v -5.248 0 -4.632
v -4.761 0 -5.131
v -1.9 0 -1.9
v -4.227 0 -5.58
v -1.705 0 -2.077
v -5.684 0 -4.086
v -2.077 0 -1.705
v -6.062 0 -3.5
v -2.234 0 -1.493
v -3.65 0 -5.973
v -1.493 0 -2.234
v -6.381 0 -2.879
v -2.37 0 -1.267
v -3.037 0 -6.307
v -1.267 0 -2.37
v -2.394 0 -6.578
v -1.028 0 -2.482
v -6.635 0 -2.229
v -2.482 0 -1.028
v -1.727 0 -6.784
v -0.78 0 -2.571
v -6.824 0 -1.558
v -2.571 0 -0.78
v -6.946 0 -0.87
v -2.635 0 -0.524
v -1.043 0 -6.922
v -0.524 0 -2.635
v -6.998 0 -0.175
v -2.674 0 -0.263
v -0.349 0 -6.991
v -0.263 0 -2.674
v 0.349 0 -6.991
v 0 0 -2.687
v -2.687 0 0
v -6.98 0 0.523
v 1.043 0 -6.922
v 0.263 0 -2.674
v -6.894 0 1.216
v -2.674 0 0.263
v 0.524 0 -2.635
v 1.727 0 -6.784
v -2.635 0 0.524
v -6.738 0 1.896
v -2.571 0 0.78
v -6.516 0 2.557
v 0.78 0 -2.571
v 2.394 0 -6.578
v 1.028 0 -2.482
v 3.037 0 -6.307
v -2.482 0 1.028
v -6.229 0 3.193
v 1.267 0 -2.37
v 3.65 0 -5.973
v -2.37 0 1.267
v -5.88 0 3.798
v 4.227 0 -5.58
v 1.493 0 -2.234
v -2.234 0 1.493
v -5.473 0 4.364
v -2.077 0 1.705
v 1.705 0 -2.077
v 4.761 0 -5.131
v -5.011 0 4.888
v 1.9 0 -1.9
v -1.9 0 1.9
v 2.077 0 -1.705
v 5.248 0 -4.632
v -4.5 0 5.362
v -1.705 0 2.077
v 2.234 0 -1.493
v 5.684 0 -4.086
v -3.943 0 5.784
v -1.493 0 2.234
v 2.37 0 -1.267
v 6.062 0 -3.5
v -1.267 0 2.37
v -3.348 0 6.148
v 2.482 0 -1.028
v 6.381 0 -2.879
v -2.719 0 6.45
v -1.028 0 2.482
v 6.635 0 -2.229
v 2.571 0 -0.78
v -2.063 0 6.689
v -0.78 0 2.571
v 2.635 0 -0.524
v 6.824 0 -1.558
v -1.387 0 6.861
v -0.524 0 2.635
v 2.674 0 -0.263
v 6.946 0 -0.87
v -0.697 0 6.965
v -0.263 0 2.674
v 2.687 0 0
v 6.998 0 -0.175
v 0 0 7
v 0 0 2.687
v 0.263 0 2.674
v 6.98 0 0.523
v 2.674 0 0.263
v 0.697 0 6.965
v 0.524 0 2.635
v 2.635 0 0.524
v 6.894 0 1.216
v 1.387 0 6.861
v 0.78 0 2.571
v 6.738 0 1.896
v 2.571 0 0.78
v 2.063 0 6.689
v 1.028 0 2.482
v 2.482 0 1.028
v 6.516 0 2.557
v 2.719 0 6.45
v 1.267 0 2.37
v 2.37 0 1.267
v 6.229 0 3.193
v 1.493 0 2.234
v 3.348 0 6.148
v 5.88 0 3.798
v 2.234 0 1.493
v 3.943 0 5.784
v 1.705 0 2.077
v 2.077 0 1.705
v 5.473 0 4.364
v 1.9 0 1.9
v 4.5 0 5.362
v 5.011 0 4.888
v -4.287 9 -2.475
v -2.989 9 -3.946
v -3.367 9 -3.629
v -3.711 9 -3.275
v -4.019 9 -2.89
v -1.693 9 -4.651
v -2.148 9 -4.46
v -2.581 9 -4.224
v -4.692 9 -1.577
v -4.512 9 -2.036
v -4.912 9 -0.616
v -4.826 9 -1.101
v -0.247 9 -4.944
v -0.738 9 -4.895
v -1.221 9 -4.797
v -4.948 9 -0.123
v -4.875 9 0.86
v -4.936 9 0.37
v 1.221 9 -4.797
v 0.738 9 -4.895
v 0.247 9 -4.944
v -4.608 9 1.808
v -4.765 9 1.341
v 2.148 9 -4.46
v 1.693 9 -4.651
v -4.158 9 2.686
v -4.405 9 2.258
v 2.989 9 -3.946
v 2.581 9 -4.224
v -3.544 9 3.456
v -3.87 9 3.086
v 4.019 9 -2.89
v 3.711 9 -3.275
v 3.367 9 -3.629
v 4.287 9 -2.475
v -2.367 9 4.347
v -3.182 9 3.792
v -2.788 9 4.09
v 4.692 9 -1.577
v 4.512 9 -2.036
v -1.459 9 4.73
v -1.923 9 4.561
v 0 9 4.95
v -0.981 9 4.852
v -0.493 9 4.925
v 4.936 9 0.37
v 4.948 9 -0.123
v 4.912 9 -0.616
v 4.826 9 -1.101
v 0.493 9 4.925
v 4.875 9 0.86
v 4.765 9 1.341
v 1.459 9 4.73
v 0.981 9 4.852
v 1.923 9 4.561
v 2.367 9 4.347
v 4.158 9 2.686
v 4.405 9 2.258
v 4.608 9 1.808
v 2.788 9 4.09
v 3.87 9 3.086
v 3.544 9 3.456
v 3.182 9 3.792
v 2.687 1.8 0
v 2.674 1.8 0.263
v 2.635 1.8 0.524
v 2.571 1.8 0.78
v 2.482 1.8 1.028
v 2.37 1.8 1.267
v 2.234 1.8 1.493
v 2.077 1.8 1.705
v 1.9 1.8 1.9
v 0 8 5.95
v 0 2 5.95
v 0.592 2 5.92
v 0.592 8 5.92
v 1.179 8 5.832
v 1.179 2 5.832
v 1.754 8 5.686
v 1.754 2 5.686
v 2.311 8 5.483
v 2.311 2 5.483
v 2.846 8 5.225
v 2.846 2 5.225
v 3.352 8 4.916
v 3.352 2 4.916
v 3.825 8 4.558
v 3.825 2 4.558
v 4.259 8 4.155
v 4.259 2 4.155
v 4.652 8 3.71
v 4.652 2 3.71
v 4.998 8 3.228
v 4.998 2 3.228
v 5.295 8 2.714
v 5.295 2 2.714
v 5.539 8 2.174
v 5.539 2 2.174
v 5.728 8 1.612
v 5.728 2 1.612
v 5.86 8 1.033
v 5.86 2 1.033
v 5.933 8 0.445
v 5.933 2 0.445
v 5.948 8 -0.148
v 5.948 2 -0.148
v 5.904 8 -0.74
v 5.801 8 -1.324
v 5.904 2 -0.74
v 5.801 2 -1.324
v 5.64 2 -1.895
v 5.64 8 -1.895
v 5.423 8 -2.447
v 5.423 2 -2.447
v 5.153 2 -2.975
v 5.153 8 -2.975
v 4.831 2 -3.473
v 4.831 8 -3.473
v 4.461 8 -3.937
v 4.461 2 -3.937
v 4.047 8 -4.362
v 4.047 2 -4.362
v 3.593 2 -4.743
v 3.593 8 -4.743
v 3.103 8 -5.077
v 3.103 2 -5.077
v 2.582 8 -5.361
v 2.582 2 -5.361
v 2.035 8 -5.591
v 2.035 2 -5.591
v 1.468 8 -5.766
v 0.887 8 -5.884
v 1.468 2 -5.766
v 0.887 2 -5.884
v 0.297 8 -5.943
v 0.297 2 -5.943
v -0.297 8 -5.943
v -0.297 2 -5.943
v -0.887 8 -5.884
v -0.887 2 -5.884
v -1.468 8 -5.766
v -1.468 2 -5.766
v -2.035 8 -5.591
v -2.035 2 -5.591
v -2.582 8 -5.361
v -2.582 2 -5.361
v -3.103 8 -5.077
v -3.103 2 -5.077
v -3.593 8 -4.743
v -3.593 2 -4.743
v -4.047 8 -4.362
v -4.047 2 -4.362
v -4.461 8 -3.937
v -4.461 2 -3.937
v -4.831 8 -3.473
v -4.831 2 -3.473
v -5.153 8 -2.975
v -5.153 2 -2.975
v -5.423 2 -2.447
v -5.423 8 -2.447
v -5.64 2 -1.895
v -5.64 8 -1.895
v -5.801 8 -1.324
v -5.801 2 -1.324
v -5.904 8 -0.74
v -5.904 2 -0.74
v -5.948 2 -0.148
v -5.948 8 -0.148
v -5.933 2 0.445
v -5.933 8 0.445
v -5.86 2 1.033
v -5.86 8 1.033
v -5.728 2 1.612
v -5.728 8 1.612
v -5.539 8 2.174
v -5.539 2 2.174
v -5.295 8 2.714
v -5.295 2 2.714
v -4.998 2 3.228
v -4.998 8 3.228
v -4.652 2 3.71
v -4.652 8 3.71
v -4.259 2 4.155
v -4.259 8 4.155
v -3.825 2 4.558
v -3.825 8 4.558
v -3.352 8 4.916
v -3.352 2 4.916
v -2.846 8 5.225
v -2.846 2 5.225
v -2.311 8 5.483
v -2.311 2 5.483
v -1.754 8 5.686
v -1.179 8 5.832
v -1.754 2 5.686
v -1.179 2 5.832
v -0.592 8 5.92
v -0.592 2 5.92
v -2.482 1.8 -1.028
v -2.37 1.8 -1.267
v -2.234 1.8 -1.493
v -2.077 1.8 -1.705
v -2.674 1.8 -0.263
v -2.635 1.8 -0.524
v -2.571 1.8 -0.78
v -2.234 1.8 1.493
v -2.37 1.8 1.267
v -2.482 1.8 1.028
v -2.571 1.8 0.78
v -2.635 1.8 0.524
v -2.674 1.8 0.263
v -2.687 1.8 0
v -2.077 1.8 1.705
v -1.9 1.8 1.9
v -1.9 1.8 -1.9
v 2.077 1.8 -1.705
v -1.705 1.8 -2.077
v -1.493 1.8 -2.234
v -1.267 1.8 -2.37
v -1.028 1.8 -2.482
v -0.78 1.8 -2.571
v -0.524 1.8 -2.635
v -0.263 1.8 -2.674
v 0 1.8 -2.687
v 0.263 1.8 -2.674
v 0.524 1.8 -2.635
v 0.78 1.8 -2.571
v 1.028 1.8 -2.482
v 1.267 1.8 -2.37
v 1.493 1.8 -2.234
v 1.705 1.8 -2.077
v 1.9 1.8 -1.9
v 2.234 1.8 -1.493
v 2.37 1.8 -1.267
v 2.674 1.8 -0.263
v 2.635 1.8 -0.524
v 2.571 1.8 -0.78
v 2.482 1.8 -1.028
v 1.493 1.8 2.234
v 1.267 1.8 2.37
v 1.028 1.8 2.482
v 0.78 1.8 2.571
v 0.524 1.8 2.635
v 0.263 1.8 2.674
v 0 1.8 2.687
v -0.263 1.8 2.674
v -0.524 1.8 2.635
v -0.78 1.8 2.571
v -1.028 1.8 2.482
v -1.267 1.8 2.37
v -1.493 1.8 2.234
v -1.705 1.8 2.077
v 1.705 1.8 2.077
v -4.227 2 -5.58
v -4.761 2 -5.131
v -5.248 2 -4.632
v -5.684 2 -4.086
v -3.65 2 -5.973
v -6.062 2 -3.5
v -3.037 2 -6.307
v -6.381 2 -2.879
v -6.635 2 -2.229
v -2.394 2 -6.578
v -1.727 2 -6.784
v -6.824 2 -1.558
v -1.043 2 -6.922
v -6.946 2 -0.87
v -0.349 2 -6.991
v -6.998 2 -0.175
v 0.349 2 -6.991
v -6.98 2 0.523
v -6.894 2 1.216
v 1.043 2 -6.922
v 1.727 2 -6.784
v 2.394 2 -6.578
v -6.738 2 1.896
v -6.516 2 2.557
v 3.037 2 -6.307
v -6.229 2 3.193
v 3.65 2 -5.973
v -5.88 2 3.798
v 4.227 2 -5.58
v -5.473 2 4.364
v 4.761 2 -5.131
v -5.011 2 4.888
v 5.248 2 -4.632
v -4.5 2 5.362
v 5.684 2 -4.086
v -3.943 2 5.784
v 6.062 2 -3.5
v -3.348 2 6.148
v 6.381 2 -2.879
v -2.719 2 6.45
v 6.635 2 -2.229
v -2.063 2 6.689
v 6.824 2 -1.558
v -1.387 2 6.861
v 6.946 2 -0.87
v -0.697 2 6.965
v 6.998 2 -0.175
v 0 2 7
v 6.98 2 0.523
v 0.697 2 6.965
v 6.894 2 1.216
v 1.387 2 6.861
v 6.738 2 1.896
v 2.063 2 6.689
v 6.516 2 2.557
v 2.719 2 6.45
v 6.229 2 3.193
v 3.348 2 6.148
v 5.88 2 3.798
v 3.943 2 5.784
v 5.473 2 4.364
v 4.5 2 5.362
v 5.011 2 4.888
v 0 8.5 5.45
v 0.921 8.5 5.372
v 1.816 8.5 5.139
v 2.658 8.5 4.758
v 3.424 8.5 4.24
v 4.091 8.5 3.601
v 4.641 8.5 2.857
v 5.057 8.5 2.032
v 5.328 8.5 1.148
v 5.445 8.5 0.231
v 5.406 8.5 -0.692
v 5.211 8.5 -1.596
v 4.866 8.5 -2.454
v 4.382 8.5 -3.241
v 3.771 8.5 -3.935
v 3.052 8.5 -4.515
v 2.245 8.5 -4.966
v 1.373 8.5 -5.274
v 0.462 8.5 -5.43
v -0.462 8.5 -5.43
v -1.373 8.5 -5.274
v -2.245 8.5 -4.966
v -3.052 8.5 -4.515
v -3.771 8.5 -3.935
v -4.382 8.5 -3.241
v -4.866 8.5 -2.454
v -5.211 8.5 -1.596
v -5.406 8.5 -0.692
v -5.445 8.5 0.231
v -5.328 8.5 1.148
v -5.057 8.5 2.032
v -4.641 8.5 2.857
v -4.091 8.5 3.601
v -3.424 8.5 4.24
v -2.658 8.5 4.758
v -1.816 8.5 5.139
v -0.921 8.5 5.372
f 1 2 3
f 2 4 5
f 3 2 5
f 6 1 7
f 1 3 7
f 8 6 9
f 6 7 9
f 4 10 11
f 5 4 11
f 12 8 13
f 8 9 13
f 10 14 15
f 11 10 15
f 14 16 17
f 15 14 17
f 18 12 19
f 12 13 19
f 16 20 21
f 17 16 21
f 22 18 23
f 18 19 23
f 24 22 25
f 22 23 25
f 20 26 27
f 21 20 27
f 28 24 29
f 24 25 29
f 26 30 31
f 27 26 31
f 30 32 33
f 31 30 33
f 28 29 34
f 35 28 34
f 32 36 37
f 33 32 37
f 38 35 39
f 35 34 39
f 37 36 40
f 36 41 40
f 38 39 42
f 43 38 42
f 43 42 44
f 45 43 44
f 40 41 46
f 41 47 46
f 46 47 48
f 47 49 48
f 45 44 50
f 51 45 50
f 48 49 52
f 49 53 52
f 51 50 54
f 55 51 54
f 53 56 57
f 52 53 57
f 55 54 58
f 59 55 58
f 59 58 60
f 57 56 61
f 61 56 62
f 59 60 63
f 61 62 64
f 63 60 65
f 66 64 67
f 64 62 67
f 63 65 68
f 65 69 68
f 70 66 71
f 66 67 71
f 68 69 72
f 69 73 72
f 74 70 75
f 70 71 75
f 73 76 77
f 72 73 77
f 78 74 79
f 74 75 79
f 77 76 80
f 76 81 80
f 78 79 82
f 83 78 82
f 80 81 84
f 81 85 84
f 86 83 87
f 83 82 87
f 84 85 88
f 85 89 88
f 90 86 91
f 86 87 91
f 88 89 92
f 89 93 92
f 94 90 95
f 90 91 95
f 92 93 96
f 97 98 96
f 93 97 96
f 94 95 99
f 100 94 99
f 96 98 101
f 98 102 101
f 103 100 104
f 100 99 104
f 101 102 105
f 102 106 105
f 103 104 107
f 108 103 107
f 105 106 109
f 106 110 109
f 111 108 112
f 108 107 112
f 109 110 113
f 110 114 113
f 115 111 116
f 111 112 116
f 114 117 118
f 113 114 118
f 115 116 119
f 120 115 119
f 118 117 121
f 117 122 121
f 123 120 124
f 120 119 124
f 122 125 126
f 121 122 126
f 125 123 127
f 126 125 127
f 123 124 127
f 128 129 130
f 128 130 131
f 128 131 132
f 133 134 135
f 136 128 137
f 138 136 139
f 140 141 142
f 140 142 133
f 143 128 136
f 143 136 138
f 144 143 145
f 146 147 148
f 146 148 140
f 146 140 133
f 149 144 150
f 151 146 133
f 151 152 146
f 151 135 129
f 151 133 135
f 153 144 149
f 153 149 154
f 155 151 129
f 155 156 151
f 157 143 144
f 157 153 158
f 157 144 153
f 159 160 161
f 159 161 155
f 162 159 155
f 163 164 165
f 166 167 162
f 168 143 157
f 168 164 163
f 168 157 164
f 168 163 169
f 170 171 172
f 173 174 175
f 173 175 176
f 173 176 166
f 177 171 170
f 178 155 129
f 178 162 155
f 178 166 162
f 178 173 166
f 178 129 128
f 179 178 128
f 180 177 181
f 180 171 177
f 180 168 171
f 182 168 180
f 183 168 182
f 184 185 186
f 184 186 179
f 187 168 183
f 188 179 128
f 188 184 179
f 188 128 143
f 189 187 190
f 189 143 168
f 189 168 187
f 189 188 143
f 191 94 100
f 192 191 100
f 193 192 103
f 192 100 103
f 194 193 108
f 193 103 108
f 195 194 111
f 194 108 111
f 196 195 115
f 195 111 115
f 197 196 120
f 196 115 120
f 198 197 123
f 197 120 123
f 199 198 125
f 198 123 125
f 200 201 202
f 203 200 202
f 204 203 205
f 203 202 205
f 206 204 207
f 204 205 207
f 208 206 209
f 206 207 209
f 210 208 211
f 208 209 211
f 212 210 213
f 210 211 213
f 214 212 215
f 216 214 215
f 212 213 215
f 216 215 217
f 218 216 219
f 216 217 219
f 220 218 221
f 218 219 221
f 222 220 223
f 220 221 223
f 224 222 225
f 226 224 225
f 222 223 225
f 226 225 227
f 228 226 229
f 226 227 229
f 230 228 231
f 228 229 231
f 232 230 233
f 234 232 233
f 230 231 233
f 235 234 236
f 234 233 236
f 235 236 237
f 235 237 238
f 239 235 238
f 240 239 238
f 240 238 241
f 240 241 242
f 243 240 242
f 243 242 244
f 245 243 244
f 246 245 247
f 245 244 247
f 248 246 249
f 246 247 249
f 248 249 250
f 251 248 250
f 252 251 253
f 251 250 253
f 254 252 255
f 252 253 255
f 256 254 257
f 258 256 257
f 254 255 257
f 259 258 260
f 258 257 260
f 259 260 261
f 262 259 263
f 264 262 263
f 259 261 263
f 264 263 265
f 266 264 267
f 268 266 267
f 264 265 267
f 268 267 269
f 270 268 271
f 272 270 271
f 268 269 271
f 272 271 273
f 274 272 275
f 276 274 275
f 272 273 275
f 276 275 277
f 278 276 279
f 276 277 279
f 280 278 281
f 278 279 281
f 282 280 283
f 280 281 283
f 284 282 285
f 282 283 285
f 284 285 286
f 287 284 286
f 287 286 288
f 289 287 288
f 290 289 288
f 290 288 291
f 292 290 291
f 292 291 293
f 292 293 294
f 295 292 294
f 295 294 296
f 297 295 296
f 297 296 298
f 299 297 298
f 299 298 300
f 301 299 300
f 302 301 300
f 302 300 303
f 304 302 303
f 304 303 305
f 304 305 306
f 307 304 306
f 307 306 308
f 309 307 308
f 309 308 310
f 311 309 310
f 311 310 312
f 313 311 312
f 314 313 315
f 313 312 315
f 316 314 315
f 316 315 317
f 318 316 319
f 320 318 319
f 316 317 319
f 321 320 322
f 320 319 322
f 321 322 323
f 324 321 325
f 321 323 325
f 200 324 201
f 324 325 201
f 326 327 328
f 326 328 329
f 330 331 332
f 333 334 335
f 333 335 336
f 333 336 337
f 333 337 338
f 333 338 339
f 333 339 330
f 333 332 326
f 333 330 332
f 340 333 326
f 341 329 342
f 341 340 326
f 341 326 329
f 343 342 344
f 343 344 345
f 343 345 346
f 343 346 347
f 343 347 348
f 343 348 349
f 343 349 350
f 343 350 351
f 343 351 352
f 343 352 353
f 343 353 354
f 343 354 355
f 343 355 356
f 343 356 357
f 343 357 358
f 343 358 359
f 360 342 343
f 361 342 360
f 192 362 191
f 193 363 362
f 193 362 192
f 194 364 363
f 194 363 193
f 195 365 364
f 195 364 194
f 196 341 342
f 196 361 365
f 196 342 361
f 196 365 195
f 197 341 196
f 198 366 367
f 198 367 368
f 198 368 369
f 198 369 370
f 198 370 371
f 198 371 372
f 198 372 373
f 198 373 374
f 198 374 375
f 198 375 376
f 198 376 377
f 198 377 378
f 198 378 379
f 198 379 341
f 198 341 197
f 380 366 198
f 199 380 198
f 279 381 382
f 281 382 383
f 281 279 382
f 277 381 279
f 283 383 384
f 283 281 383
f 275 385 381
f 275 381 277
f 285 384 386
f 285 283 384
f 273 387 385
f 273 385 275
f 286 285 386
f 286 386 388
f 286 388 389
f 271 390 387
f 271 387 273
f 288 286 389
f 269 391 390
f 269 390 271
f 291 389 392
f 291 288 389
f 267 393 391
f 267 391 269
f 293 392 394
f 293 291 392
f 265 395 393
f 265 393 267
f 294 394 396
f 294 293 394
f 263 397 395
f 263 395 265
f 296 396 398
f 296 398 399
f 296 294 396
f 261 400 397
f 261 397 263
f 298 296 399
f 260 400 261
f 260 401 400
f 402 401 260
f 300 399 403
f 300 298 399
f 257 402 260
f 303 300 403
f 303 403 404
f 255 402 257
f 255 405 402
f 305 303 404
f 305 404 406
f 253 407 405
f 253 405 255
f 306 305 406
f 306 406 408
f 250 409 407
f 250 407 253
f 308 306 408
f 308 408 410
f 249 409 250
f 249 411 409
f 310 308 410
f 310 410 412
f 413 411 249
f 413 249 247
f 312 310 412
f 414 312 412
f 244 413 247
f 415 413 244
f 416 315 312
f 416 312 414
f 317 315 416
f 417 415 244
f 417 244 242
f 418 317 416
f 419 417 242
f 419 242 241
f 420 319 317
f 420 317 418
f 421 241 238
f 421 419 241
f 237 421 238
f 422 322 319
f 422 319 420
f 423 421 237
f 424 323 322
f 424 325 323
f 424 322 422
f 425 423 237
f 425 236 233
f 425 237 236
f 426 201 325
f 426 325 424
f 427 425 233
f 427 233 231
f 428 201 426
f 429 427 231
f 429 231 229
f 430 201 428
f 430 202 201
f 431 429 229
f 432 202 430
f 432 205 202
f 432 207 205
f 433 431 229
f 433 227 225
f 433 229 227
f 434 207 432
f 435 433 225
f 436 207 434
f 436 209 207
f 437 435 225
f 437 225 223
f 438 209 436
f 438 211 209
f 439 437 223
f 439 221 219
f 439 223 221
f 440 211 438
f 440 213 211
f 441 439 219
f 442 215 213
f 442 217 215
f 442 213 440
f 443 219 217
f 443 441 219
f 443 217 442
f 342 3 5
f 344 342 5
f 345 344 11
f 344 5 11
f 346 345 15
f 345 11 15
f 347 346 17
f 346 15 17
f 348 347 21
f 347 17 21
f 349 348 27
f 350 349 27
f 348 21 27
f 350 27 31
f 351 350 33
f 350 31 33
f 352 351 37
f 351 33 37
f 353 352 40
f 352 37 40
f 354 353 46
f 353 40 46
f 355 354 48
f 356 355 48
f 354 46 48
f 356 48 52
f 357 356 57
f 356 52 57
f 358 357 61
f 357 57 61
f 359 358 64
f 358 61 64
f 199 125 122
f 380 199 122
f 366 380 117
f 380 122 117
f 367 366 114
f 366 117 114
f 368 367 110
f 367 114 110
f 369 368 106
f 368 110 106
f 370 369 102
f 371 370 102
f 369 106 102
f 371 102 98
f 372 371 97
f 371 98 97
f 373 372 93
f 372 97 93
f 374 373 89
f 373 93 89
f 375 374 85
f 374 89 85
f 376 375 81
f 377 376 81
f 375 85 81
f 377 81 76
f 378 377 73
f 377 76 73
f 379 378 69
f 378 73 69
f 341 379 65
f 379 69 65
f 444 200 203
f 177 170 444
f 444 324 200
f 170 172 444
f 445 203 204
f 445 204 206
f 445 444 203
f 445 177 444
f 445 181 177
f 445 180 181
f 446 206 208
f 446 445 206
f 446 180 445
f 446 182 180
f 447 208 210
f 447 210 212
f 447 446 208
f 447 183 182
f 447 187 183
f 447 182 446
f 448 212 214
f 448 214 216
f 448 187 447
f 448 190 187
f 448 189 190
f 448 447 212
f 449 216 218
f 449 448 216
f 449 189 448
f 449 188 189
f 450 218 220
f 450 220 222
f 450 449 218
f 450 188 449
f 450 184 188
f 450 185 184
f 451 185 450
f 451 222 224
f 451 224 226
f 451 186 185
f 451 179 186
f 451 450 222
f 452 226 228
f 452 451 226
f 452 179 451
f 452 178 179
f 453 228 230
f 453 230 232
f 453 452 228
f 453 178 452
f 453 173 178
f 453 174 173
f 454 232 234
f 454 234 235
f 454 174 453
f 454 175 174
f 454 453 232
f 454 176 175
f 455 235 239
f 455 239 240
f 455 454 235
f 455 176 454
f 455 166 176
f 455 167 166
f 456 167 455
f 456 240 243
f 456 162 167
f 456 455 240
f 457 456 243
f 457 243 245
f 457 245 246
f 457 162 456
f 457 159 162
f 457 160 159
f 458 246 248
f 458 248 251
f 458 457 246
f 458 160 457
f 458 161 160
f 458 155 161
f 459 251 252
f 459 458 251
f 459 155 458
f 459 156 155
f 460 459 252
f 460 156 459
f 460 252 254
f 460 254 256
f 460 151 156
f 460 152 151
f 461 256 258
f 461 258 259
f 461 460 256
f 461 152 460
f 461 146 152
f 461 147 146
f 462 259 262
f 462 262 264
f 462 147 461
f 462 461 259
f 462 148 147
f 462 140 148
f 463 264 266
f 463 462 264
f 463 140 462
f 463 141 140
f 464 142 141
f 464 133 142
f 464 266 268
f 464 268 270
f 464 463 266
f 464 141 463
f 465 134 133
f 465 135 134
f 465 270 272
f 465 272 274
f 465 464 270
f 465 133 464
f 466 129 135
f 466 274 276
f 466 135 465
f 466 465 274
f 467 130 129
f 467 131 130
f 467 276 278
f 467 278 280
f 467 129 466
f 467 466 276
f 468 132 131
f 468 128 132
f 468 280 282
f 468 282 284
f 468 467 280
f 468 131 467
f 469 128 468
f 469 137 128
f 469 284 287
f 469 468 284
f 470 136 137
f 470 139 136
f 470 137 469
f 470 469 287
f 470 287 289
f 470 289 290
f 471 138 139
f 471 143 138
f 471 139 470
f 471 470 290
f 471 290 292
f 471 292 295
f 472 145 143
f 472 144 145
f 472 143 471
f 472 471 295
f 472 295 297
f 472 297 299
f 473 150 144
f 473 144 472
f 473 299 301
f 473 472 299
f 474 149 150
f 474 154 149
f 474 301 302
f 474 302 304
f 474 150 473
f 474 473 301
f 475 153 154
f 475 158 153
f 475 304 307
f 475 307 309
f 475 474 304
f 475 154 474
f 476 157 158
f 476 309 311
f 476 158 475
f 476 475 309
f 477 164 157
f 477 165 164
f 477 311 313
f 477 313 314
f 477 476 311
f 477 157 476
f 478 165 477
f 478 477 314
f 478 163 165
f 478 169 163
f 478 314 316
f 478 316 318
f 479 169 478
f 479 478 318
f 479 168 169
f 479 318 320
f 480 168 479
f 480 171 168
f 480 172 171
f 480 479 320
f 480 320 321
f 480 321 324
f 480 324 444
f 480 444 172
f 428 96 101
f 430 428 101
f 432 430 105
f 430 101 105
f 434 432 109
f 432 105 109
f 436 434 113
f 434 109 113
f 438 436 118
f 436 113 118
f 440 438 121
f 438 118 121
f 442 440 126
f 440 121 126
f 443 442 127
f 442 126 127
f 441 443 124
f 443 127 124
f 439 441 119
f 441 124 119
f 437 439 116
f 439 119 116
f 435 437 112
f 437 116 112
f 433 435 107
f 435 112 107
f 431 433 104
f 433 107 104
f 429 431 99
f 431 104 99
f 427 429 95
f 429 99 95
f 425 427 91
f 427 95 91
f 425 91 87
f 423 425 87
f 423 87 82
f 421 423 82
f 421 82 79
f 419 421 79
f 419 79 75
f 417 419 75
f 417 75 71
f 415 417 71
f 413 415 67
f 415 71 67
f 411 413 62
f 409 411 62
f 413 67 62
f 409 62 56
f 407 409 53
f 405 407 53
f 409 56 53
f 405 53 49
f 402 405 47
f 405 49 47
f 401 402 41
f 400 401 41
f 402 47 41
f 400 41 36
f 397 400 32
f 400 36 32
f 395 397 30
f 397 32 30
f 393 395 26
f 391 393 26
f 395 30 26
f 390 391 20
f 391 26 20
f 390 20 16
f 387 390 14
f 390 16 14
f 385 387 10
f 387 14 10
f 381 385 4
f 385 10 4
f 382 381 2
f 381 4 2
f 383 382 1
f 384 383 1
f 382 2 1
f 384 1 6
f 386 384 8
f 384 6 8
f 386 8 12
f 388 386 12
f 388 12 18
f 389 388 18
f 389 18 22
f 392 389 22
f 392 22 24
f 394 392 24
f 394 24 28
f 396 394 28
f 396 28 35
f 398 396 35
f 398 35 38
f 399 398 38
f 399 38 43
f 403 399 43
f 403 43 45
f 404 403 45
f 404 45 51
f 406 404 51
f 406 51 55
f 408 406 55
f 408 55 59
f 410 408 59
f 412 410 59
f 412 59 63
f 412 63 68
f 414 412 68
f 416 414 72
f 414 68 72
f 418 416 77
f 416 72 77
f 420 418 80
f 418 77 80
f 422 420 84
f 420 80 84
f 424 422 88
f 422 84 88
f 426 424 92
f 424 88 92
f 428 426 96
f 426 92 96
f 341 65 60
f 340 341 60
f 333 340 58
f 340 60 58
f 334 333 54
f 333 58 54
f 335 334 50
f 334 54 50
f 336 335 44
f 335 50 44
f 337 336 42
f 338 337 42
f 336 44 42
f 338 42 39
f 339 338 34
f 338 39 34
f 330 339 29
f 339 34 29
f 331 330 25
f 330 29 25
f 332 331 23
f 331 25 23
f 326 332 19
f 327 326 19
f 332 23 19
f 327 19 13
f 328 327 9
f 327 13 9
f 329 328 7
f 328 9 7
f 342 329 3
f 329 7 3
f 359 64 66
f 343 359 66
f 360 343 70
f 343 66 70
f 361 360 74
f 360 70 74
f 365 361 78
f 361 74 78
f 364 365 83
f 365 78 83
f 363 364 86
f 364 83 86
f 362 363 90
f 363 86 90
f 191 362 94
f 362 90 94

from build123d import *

# Parameters (mm, degrees)
SKETCH1_R           = 7
BOSS_EXTRUDE1_DEPTH = 2
SKETCH2_R           = 5.95
BOSS_EXTRUDE2_DEPTH = 7
SKETCH3_W           = 3.8
SKETCH3_H           = 3.8
CUT_EXTRUDE1_DEPTH  = 1.8
CHAMFER1_SIZE       = 1


with BuildPart() as part:
    # Sketch1 → Boss-Extrude1 (new body)
    with BuildSketch(Plane(origin=(0, 0, 0), x_dir=(1, 0, 0), z_dir=(0, 1, 0))):
        with Locations(Location((0, 0, 0), (0, 0, 270))):
            Circle(SKETCH1_R)
    extrude(amount=BOSS_EXTRUDE1_DEPTH)

    # Sketch2 → Boss-Extrude2 (add)
    with BuildSketch(Plane(origin=(0, 2, 0), x_dir=(1, 0, 0), z_dir=(0, 1, 0))):
        with Locations(Location((0, 0, 0), (0, 0, 270))):
            Circle(SKETCH2_R)
    extrude(amount=BOSS_EXTRUDE2_DEPTH)

    # Sketch3 → Cut-Extrude1 (cut)
    with BuildSketch(Plane.XZ):
        with BuildLine():
            ThreePointArc((-1.9, 1.9), (-2.687005769, 0), (-1.9, -1.9))
            Line((-1.9, -1.9), (-1.9, 1.9))
        make_face()
        Rectangle(SKETCH3_W, SKETCH3_H)
        with BuildLine():
            ThreePointArc((1.9, 1.9), (0, 2.687005769), (-1.9, 1.9))
            Line((-1.9, 1.9), (1.9, 1.9))
        make_face()
        with BuildLine():
            Line((1.9, 1.9), (1.9, -1.9))
            ThreePointArc((1.9, -1.9), (2.482469633, -1.02827259), (2.687005769, 0))
            ThreePointArc((2.687005769, 0), (2.482469633, 1.02827259), (1.9, 1.9))
        make_face()
        with BuildLine():
            Line((1.9, -1.9), (-1.9, -1.9))
            ThreePointArc((-1.9, -1.9), (0, -2.687005769), (1.9, -1.9))
        make_face()
    extrude(amount=-CUT_EXTRUDE1_DEPTH, mode=Mode.SUBTRACT)

    # Chamfer1
    chamfer1_edges = [part.edges().sort_by_distance(p)[0] for p in [
        (0, 9, -5.95),
    ]]
    chamfer(chamfer1_edges, length=CHAMFER1_SIZE)


solid = part.part
